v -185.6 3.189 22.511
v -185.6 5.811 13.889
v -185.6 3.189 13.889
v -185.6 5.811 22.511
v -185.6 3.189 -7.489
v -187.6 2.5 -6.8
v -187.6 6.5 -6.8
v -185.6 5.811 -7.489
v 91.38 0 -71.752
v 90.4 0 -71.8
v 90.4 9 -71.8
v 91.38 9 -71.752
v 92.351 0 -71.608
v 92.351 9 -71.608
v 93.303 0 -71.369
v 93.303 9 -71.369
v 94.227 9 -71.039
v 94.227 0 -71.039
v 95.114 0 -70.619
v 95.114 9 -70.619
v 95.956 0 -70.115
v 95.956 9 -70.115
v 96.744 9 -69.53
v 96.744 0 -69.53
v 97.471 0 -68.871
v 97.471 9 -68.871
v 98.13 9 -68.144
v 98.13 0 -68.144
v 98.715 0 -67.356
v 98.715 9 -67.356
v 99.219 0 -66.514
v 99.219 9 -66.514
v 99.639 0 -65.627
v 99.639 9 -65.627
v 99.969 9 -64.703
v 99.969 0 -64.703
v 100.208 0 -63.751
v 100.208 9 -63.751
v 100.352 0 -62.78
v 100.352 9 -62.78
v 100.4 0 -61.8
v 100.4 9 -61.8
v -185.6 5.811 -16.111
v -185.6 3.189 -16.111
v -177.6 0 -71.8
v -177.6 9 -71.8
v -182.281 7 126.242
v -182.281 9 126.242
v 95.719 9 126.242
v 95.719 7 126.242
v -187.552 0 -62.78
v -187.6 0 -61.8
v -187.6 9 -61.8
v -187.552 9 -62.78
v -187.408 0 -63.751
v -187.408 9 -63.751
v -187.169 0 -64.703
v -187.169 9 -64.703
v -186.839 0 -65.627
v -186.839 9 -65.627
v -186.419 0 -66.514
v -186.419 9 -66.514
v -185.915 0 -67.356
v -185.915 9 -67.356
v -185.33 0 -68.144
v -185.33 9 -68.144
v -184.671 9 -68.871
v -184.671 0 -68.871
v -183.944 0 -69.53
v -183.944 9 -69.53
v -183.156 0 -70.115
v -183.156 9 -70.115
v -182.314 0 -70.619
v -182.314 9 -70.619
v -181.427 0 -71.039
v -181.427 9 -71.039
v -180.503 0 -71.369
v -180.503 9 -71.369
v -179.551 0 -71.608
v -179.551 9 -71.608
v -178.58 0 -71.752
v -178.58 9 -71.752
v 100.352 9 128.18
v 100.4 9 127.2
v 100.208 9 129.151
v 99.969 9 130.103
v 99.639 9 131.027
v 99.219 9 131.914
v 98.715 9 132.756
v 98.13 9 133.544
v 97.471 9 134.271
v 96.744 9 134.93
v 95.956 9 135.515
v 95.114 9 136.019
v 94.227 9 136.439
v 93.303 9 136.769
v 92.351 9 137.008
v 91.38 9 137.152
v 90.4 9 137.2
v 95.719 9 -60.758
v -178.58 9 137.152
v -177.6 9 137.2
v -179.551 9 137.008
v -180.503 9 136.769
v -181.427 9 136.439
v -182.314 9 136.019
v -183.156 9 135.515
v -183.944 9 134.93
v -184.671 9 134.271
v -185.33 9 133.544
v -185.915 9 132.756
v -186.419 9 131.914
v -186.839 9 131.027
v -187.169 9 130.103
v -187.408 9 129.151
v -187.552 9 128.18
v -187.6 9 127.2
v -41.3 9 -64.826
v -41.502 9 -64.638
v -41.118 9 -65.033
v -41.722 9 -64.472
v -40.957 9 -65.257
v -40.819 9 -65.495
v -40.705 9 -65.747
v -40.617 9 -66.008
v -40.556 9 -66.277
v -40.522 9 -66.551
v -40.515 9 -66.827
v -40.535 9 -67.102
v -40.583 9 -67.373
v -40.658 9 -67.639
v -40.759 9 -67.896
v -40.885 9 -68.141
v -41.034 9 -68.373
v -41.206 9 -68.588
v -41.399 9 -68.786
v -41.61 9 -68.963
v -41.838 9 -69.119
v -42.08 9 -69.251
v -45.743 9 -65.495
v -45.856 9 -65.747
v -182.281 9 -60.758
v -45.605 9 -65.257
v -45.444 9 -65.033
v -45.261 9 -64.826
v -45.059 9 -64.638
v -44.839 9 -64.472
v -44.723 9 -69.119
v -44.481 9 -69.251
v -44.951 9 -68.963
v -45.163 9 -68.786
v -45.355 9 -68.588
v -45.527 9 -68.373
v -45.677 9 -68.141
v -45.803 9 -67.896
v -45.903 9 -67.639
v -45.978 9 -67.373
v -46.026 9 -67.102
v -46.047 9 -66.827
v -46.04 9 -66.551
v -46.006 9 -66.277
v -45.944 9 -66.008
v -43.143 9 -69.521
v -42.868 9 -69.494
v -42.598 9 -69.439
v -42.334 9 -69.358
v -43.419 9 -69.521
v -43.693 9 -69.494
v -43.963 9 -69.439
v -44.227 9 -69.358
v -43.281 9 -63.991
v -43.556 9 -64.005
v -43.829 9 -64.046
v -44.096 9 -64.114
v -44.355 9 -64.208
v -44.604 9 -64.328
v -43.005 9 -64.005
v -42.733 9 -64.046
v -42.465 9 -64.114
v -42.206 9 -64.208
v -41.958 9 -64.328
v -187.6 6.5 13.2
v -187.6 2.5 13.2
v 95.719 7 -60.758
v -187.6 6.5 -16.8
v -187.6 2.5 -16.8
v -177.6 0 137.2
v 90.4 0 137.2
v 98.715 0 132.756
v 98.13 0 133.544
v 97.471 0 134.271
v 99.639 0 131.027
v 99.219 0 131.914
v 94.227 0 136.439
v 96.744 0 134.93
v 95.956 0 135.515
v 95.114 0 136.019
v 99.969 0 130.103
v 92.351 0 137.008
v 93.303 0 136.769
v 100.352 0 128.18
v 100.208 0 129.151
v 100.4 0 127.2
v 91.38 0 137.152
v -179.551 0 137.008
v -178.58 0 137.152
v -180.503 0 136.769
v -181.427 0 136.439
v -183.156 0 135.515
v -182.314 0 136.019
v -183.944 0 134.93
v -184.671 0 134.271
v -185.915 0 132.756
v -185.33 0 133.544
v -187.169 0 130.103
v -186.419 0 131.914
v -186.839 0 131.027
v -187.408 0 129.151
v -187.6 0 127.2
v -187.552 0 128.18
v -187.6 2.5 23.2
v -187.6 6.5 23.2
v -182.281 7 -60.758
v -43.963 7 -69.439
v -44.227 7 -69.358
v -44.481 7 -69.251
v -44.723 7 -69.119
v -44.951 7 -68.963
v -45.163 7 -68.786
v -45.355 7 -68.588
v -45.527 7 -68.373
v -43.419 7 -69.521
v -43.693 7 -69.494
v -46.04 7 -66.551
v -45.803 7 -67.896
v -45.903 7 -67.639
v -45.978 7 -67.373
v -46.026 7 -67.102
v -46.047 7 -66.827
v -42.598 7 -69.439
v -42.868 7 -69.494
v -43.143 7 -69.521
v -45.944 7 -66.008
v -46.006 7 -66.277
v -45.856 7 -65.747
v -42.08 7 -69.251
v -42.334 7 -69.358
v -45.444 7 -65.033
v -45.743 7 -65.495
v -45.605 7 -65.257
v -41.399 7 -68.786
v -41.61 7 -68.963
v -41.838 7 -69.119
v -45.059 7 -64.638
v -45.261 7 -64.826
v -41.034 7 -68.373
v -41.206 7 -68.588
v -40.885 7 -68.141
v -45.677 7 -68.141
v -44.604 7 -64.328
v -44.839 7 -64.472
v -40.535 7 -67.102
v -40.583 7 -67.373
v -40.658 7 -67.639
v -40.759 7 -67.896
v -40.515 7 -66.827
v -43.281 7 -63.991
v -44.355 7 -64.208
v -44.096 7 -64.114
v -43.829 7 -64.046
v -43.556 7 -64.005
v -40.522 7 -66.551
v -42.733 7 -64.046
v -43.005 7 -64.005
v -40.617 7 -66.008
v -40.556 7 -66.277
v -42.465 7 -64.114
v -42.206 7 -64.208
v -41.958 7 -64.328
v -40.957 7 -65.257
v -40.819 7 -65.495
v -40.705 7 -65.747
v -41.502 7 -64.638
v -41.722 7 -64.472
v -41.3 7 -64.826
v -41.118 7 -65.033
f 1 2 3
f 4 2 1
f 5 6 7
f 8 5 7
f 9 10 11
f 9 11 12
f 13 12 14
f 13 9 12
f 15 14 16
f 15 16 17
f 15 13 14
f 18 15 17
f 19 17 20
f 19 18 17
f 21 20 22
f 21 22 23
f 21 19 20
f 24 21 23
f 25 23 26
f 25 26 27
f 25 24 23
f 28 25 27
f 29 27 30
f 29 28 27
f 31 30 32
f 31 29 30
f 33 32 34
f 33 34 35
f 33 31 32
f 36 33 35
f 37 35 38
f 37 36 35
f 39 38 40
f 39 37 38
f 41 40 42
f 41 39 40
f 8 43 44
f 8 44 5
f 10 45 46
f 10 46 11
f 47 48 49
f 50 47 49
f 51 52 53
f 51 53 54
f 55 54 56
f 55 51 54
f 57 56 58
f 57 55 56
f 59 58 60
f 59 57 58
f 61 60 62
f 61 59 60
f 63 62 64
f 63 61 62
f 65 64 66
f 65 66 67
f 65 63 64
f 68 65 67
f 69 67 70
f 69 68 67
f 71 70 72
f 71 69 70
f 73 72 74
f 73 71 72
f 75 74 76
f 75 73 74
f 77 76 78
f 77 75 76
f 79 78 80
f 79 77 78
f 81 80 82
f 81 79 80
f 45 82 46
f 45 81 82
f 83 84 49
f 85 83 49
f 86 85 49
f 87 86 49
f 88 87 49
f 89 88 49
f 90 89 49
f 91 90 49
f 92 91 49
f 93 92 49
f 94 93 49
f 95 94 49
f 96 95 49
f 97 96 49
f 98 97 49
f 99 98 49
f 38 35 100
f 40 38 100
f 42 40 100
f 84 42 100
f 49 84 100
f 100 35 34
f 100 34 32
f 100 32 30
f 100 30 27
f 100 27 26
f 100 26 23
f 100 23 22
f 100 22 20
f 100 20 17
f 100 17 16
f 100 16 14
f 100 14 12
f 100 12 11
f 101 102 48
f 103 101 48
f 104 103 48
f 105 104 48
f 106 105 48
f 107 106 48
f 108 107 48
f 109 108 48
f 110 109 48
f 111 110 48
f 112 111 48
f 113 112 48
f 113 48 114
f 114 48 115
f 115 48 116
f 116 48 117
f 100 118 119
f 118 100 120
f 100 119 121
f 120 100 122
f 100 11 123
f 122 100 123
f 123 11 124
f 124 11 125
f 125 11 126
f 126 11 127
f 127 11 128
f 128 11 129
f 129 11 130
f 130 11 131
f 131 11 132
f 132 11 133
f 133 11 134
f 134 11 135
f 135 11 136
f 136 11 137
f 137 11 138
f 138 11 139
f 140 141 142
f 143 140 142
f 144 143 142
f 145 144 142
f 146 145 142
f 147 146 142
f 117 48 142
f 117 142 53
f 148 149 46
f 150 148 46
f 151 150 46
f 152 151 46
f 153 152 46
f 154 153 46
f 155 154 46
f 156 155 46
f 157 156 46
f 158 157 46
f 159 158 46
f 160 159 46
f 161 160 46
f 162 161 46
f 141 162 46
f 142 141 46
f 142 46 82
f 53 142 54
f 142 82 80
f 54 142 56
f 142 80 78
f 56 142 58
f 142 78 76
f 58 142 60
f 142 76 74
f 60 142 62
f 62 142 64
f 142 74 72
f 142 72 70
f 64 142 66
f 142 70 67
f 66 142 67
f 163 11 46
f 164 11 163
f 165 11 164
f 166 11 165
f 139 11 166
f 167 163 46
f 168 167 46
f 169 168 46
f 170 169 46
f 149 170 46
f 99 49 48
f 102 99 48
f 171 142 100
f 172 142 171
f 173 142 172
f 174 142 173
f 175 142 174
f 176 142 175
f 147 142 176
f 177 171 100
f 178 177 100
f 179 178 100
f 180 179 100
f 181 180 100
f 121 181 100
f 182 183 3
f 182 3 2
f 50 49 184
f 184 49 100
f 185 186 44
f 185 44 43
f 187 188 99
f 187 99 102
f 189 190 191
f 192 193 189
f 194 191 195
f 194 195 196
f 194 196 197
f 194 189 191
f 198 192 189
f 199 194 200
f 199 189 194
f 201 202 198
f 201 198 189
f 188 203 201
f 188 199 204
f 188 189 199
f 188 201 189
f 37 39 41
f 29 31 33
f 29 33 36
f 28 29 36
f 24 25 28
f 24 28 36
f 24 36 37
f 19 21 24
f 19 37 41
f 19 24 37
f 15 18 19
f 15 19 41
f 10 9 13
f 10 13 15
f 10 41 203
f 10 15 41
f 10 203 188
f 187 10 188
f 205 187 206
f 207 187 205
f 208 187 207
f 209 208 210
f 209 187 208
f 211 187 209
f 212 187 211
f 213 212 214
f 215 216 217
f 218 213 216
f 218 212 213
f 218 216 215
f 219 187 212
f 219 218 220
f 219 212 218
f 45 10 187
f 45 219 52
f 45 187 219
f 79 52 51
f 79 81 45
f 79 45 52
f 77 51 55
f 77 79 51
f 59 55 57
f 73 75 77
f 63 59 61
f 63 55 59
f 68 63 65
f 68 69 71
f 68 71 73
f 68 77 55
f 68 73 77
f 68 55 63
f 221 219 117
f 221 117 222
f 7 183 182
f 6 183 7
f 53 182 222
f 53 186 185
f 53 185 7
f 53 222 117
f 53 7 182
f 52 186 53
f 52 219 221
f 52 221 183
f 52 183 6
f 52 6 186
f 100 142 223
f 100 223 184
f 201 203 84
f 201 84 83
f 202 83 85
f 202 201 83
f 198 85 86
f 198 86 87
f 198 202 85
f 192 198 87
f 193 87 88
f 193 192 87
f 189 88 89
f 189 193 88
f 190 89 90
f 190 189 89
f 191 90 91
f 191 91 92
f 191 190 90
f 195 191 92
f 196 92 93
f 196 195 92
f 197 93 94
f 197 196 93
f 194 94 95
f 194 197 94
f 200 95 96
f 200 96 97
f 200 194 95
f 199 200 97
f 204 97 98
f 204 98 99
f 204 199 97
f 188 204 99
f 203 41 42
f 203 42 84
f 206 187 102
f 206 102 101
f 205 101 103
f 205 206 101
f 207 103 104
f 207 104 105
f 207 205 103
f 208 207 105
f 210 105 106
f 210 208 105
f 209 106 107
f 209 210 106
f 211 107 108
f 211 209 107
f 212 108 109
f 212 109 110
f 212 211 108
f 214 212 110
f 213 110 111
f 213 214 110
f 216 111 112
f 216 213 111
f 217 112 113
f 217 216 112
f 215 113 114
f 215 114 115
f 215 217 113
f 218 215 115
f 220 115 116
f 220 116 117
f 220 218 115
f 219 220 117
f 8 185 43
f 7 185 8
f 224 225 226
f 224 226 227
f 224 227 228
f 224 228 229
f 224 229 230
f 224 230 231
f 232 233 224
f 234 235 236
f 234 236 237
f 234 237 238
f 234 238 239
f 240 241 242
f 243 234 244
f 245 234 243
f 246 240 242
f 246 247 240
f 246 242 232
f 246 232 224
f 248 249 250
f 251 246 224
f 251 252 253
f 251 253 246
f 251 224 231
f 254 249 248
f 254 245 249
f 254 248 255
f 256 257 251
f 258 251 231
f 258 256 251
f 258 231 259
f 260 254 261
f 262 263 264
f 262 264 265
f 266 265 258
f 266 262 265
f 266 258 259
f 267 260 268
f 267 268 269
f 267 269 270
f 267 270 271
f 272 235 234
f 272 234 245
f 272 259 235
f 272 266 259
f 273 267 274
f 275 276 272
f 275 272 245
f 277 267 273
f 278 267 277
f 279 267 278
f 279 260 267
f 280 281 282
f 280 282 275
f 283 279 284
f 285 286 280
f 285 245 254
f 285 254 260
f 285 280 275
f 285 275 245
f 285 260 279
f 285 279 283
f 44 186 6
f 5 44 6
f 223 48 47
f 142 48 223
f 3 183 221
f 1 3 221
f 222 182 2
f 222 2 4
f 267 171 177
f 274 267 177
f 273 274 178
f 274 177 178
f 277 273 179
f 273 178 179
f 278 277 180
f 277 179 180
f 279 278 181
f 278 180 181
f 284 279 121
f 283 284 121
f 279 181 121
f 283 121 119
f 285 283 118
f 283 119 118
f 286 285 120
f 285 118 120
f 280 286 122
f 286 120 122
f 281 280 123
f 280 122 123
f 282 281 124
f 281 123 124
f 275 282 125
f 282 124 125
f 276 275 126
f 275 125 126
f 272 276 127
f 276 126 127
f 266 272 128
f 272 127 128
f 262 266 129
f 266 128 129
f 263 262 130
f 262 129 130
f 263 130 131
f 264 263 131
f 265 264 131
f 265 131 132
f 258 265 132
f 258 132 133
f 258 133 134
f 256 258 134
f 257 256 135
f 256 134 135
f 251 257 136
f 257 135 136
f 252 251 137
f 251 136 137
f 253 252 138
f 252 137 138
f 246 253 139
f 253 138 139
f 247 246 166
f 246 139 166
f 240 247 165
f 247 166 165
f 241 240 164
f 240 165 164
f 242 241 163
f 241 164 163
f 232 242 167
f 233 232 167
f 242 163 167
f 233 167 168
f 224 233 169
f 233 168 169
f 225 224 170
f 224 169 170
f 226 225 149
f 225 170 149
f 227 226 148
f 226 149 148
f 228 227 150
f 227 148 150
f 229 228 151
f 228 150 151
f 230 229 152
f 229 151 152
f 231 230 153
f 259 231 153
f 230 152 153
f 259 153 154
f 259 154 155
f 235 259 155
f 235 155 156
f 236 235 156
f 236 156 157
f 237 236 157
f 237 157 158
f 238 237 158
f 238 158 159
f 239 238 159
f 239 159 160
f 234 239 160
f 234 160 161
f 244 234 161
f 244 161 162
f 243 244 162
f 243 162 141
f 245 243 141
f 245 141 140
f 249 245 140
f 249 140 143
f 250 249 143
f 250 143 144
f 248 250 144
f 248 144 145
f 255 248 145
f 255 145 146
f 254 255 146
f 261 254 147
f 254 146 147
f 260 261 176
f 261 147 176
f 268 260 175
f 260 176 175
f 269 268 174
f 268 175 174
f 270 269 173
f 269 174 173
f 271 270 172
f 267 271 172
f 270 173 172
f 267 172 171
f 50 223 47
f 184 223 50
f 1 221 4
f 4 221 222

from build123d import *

# Parameters (mm, degrees)
BOSS_EXTRUDE1_DEPTH          = 9
SKETCH2_R                    = 2.766798225
SKETCH2_W                    = 278
SKETCH2_H                    = 187
CUT_EXTRUDE1_DEPTH           = 2
SKETCH4_W                    = 10
SKETCH4_H                    = 4
CUT_EXTRUDE2_DEPTH           = 2
CUT_EXTRUDE2_DRAFT           = -19
CUT_EXTRUDE2_PROFILE_2_DEPTH = 2
CUT_EXTRUDE2_PROFILE_2_DRAFT = -19


with BuildPart() as part:
    # Sketch1 → Boss-Extrude1 (new body)
    with BuildSketch(Plane(origin=(0, 0, 0), x_dir=(1, 0, 0), z_dir=(0, 1, 0))):
        with BuildLine():
            Line((-177.6, 71.8), (90.4, 71.8))
            ThreePointArc((90.4, 71.8), (97.471067812, 68.871067812), (100.4, 61.8))
            Line((100.4, 61.8), (100.4, -127.2))
            ThreePointArc((100.4, -127.2), (97.471067812, -134.271067812), (90.4, -137.2))
            Line((90.4, -137.2), (-177.6, -137.2))
            ThreePointArc((-177.6, -137.2), (-184.671067812, -134.271067812), (-187.6, -127.2))
            Line((-187.6, -127.2), (-187.6, 61.8))
            ThreePointArc((-187.6, 61.8), (-184.671067812, 68.871067812), (-177.6, 71.8))
        make_face()
    extrude(amount=BOSS_EXTRUDE1_DEPTH)

    # Sketch2 → Cut-Extrude1 (cut)
    with BuildSketch(Plane(origin=(0, 9, 0), x_dir=(1, 0, 0), z_dir=(0, 1, 0))):
        with Locations(Location((-43.280764326, 66.757707022, 0), (0, 0, 270))):
            Circle(SKETCH2_R)
        with Locations((-43.280764326, -32.742292978)):
            Rectangle(SKETCH2_W, SKETCH2_H)
    extrude(amount=-CUT_EXTRUDE1_DEPTH, mode=Mode.SUBTRACT)


with BuildPart() as cut_extrude2_tool:
    # Sketch4 → Cut-Extrude2 (with draft: the straight prism first)
    with BuildSketch(Plane.ZY.offset(187.6)):
        with Locations((-11.8, 4.5)):
            Rectangle(SKETCH4_W, SKETCH4_H)
    extrude(amount=-CUT_EXTRUDE2_DEPTH)
    # Cut-Extrude2: the draft: its side faces are tilted about the plane it starts from
    cut_extrude2_sides = [cut_extrude2_tool.faces().sort_by_distance(p)[0] for p in [
        (-186.6, 6.5, -11.8),
        (-186.6, 4.5, -16.8),
        (-186.6, 2.5, -11.8),
        (-186.6, 4.5, -6.8),
    ]]
    draft(cut_extrude2_sides, Plane.ZY.offset(187.6), CUT_EXTRUDE2_DRAFT)


with BuildPart() as part_1:
    add(part.part)

    # Cut-Extrude2: cut by cut_extrude2_tool
    add(cut_extrude2_tool.part, mode=Mode.SUBTRACT)


with BuildPart() as cut_extrude2_profile_2_tool:
    # Sketch4 → Cut-Extrude2 profile 2 (with draft: the straight prism first)
    with BuildSketch(Plane.ZY.offset(187.6)):
        with Locations((18.2, 4.5)):
            Rectangle(SKETCH4_W, SKETCH4_H)
    extrude(amount=-CUT_EXTRUDE2_PROFILE_2_DEPTH)
    # Cut-Extrude2 profile 2: the draft: its side faces are tilted about the plane it starts from
    cut_extrude2_profile_2_sides = [cut_extrude2_profile_2_tool.faces().sort_by_distance(p)[0] for p in [
        (-186.6, 2.5, 18.2),
        (-186.6, 4.5, 23.2),
        (-186.6, 6.5, 18.2),
        (-186.6, 4.5, 13.2),
    ]]
    draft(cut_extrude2_profile_2_sides, Plane.ZY.offset(187.6), CUT_EXTRUDE2_PROFILE_2_DRAFT)


with BuildPart() as part_2:
    add(part_1.part)

    # Cut-Extrude2 profile 2: cut by cut_extrude2_profile_2_tool
    add(cut_extrude2_profile_2_tool.part, mode=Mode.SUBTRACT)


solid = part_2.part
